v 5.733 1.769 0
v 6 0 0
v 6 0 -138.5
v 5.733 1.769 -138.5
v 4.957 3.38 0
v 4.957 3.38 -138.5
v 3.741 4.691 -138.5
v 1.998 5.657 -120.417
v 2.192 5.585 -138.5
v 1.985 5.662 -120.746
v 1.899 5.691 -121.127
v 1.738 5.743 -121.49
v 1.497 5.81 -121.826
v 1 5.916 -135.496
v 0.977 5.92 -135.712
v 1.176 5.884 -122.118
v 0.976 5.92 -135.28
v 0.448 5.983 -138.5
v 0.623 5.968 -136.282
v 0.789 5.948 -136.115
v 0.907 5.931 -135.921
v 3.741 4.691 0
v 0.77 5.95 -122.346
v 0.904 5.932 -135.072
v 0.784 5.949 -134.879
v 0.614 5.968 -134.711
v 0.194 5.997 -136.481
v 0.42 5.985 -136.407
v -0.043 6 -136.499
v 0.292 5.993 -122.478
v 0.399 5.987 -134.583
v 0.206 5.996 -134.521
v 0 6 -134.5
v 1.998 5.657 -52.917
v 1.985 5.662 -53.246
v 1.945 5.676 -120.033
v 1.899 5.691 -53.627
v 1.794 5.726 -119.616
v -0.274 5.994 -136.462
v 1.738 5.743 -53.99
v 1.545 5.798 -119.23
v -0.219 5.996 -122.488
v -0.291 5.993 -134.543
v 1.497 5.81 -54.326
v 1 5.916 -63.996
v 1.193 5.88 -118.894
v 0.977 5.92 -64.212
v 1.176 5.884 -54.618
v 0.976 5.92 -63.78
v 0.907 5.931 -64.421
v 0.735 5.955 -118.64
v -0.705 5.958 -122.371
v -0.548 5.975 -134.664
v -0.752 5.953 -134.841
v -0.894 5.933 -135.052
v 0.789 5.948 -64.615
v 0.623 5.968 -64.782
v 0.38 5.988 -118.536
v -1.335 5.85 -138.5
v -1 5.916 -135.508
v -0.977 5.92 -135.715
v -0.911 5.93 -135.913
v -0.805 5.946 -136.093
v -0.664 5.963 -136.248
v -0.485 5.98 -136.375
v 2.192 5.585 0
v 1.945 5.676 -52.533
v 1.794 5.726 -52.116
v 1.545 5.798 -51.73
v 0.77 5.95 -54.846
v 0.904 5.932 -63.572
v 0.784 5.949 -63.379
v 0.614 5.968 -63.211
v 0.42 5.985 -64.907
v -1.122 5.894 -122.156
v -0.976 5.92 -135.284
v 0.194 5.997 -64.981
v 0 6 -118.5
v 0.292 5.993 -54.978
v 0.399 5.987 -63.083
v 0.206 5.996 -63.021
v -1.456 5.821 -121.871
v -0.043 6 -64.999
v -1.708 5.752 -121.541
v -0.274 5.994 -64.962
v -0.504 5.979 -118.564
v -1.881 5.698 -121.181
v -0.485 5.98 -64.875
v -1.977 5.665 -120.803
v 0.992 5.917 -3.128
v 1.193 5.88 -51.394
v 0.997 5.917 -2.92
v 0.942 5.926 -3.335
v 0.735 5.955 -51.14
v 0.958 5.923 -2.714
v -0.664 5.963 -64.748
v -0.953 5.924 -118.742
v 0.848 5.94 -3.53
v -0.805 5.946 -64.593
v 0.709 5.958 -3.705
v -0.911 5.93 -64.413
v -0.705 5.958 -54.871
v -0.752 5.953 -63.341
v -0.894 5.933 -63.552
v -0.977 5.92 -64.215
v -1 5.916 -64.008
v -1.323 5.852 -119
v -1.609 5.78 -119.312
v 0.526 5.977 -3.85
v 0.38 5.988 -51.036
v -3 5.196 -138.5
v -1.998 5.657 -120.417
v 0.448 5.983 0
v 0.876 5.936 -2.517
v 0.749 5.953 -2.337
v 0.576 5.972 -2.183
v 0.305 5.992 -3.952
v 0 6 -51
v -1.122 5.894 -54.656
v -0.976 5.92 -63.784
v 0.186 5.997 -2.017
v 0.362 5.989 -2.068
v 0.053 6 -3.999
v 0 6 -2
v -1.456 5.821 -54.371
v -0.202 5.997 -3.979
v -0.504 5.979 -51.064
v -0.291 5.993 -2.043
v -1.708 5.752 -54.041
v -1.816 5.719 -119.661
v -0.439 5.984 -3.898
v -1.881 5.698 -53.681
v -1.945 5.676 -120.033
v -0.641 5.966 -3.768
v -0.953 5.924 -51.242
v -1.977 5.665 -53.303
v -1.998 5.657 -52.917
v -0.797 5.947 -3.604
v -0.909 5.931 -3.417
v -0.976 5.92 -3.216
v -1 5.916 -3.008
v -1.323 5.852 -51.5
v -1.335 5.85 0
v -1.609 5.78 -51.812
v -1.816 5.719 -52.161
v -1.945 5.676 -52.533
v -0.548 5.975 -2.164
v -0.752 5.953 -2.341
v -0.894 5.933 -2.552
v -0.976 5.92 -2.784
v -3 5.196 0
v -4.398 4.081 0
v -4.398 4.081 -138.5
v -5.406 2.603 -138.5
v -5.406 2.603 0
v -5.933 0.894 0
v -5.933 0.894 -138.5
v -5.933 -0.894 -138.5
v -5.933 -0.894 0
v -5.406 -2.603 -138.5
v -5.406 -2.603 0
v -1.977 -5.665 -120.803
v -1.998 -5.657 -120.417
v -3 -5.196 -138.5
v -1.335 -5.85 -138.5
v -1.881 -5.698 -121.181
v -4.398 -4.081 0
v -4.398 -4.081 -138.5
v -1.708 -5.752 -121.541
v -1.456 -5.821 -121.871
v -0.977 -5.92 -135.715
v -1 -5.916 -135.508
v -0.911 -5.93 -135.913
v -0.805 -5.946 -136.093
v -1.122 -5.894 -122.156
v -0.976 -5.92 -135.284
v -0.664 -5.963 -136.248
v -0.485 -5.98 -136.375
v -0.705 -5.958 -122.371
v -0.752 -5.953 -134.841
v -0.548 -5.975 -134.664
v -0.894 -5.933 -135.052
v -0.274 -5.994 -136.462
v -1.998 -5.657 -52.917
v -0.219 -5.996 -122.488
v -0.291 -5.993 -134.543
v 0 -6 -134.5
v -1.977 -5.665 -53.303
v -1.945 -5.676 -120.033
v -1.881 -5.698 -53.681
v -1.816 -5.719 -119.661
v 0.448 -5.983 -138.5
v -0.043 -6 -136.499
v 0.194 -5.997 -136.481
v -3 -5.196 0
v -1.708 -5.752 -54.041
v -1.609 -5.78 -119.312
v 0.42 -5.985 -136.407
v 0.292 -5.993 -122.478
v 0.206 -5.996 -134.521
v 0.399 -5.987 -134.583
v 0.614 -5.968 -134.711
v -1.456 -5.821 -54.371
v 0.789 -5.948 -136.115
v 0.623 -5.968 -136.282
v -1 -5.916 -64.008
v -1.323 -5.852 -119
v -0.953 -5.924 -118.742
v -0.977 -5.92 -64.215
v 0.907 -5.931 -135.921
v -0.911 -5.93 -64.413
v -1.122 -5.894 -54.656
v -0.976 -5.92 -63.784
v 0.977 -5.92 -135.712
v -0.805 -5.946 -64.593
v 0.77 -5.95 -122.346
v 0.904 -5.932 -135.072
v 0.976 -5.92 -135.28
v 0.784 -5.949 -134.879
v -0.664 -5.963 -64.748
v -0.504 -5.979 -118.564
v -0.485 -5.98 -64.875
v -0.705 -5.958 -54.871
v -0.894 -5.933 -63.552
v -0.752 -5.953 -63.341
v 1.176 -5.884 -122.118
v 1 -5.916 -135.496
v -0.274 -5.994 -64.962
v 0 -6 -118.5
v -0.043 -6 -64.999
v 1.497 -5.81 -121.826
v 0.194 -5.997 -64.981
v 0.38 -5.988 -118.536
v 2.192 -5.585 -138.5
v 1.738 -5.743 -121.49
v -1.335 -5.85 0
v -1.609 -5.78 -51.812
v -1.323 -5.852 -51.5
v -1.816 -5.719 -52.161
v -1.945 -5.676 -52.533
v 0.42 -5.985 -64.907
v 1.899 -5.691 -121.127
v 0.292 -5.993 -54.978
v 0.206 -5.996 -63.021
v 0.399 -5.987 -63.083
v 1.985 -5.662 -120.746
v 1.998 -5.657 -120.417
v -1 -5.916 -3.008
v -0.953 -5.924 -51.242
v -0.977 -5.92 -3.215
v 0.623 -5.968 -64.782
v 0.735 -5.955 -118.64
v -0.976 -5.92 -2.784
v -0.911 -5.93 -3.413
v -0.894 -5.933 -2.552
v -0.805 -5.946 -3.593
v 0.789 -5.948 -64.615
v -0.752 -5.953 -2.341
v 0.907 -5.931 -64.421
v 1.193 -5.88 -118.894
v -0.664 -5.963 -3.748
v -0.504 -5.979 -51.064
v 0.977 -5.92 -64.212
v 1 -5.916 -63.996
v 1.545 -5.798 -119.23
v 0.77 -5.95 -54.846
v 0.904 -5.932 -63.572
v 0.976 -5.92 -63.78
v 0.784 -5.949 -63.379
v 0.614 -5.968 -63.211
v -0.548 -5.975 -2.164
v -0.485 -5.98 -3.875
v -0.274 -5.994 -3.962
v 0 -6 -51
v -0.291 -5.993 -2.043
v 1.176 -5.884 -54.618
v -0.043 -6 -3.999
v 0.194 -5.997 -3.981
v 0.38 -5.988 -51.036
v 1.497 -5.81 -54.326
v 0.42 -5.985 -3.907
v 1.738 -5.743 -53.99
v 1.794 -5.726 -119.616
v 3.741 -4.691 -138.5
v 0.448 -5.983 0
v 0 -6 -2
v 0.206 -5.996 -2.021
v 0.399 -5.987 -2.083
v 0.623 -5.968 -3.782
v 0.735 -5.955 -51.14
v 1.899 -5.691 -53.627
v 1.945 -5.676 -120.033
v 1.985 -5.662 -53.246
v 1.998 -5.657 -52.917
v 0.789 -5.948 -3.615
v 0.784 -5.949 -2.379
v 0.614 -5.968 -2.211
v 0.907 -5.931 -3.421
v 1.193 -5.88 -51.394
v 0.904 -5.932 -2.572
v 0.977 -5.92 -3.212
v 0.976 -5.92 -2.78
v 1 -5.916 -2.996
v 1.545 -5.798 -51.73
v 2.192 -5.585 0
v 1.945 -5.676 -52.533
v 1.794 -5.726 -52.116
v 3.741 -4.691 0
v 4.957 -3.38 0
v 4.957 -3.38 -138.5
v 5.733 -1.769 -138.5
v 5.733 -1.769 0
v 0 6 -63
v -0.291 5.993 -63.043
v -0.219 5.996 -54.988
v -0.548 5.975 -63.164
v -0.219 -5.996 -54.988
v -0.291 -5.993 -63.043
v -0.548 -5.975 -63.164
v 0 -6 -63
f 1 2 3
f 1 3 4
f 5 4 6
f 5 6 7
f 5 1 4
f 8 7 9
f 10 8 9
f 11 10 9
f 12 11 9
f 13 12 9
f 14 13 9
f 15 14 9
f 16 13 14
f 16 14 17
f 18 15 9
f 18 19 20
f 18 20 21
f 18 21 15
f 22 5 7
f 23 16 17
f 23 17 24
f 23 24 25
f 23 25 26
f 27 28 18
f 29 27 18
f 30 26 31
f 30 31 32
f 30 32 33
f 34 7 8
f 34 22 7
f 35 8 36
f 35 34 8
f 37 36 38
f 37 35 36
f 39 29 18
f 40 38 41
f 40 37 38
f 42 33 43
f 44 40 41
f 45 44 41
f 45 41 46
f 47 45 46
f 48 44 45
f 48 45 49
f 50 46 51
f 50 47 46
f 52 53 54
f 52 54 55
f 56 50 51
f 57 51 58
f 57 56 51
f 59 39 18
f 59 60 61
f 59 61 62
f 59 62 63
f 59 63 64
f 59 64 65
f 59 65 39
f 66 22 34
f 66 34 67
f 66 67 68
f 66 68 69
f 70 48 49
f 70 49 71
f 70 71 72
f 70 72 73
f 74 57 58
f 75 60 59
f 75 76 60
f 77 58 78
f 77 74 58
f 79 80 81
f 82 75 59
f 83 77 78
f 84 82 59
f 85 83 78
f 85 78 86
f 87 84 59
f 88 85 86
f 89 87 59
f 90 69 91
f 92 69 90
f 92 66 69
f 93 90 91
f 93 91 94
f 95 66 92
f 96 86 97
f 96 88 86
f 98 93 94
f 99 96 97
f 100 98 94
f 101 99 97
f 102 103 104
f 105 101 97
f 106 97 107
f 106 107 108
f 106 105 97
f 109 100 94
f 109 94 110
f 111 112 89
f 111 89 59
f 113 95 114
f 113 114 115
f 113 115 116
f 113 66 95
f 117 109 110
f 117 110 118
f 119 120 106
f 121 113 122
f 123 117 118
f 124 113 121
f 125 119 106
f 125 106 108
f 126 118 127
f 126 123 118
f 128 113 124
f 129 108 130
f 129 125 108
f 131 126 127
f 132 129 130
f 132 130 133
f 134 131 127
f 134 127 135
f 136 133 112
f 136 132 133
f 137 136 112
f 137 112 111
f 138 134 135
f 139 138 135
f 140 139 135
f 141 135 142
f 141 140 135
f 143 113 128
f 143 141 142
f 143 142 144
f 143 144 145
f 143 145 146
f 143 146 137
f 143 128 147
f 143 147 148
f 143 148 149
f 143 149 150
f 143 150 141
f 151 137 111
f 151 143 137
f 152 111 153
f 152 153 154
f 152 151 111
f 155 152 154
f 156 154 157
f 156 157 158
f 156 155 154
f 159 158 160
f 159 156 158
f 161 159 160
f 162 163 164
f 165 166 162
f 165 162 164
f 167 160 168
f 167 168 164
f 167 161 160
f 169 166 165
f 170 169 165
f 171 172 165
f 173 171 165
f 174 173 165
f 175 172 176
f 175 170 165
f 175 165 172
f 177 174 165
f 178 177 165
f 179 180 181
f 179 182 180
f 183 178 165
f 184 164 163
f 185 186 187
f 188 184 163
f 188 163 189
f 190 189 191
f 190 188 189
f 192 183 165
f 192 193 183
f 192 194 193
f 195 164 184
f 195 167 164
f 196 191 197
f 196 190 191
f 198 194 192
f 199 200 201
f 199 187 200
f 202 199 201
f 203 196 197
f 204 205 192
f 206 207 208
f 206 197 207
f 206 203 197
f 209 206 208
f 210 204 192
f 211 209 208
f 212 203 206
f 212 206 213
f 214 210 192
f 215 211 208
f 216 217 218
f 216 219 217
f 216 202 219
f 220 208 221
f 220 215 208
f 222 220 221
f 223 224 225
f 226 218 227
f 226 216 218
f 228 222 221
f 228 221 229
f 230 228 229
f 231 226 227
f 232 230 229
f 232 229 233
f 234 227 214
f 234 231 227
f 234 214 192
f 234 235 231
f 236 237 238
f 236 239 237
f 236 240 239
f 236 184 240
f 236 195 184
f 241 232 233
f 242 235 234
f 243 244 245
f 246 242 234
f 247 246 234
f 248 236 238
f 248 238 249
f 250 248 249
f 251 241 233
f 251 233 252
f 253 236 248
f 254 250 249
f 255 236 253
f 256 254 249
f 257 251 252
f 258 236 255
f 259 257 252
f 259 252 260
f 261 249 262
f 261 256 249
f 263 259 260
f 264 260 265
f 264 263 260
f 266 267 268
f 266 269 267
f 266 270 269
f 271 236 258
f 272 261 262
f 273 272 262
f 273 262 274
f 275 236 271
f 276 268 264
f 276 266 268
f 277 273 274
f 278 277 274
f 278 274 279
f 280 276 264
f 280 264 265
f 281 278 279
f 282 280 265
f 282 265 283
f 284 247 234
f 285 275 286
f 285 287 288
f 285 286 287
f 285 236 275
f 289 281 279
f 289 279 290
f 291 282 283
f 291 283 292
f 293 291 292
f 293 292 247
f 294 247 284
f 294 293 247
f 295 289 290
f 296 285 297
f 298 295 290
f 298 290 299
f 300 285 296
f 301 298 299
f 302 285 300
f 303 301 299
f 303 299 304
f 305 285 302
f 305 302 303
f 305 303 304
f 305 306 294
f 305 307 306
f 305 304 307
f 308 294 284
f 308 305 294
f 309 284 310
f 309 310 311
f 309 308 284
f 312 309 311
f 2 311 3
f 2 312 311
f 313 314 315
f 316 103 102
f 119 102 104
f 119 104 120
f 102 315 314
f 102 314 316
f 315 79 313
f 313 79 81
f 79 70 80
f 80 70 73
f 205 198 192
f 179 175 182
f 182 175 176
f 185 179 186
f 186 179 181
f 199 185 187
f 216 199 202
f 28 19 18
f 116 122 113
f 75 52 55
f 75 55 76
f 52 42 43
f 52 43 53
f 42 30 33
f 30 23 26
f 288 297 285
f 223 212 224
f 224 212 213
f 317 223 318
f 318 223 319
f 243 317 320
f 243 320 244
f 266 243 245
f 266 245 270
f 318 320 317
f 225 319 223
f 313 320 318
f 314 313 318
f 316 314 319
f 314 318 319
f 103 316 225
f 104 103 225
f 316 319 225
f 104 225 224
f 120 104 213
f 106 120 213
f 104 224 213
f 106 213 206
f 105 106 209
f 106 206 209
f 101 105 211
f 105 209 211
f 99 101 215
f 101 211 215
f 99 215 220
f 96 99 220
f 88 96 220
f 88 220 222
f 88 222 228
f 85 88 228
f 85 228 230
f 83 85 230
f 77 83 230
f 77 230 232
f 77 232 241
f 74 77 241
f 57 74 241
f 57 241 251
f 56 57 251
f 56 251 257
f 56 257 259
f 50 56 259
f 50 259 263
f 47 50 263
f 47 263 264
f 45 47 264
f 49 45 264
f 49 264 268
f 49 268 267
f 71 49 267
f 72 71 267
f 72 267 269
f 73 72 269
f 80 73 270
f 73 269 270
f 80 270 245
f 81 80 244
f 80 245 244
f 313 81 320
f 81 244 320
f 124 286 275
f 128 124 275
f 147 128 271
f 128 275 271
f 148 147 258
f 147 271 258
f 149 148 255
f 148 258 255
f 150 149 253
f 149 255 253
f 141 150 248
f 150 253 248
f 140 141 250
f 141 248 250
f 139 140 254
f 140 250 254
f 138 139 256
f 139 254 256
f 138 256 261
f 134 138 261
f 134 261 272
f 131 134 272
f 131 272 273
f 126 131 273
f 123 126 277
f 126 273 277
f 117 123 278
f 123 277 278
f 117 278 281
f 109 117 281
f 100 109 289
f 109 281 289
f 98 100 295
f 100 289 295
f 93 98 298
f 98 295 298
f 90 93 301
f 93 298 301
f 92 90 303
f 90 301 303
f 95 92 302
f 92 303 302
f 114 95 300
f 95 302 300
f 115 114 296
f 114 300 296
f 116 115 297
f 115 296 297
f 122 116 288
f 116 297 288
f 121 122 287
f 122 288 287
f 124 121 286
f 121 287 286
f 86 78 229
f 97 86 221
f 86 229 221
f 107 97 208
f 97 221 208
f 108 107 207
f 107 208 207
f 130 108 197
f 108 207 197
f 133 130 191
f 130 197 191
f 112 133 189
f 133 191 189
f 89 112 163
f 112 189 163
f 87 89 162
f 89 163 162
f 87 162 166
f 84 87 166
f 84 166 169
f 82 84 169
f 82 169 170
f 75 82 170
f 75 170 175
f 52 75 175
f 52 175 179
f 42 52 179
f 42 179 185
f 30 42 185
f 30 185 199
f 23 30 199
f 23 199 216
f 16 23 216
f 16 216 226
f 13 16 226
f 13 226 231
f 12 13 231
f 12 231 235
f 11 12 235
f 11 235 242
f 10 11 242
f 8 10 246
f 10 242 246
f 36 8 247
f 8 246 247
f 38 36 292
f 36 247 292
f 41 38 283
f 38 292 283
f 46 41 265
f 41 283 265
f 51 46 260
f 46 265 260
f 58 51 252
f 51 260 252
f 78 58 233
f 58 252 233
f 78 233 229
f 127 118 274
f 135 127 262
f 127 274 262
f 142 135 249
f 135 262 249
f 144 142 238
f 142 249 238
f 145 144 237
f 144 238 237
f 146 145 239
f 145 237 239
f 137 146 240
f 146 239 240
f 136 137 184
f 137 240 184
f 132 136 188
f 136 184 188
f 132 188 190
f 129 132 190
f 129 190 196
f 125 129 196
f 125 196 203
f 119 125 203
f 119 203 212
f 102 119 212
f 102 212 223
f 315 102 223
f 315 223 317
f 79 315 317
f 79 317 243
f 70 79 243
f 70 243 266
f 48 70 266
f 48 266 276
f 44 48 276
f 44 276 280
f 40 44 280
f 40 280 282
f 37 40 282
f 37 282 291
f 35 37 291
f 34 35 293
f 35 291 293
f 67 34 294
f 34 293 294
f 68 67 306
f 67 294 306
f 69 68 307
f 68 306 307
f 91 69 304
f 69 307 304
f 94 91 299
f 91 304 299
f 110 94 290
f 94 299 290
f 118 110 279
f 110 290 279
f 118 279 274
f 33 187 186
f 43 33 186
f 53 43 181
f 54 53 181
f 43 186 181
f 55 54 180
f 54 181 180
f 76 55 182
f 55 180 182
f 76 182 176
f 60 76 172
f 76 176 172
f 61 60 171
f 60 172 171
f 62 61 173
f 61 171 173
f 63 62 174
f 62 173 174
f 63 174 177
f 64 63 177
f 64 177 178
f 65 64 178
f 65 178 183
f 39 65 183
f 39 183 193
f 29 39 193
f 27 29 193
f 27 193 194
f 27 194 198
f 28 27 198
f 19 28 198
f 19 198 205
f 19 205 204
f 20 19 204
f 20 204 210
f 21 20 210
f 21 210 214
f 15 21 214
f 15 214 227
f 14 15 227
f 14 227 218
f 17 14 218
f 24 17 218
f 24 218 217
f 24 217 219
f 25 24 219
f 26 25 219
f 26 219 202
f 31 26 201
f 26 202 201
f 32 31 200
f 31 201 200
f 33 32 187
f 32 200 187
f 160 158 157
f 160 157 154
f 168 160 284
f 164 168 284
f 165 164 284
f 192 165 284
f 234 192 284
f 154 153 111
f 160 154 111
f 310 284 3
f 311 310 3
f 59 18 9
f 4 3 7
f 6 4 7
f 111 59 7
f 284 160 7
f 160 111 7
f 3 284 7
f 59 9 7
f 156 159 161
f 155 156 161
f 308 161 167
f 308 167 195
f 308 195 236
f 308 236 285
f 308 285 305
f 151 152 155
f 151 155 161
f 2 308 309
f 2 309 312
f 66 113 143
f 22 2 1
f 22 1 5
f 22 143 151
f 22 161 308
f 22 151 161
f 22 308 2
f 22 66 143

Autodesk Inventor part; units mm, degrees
ref_plane "YZ Plane" through (0, 0, 0) normal (1, 0, 0) x (0, 1, 0)
ref_plane "XZ Plane" through (0, 0, 0) normal (0, 1, 0) x (-1, 0, 0)
ref_plane "XY Plane" through (0, 0, 0) normal (0, 0, 1) x (1, 0, 0)
sketch "スケッチ1" plane through (0, 0, 0) normal (0, 0, 1) x (1, 0, 0)
  circle A0 centre (0, 0) radius 6
  dimension "d0" = 12
extrude "押し出し1" add sketch "スケッチ1" against normal blind 138.5
sketch "スケッチ2" plane through (0, 0, 0) normal (0, 1, 0) x (-1, 0, 0)
  line L0 (0, 0) -> (0, -138.5)
  line L1 (-6, -138.5) -> (6, -138.5) projected
  line L2 (6, 0) -> (-6, 0) projected
  point P0 (0, -3)
  point P1 (0, -53)
  point P2 (0, -64)
  point P3 (0, -120.5)
  point P4 (0, -135.5)
  dimension "d3" = 3
  dimension "d4" = 53
  dimension "d5" = 64
  dimension "d6" = 3
  dimension "d7" = 18
hole "穴1" at (0, 0, -3) at (0, 0, -64) at (0, 0, -135.5) direction (0, -1, 0) diameter 2 end through all both
hole "穴2" at (0, 0, -53) at (0, 0, -120.5) direction (0, -1, 0) diameter 4 end through all both
properties part number "ローラー_軸"
